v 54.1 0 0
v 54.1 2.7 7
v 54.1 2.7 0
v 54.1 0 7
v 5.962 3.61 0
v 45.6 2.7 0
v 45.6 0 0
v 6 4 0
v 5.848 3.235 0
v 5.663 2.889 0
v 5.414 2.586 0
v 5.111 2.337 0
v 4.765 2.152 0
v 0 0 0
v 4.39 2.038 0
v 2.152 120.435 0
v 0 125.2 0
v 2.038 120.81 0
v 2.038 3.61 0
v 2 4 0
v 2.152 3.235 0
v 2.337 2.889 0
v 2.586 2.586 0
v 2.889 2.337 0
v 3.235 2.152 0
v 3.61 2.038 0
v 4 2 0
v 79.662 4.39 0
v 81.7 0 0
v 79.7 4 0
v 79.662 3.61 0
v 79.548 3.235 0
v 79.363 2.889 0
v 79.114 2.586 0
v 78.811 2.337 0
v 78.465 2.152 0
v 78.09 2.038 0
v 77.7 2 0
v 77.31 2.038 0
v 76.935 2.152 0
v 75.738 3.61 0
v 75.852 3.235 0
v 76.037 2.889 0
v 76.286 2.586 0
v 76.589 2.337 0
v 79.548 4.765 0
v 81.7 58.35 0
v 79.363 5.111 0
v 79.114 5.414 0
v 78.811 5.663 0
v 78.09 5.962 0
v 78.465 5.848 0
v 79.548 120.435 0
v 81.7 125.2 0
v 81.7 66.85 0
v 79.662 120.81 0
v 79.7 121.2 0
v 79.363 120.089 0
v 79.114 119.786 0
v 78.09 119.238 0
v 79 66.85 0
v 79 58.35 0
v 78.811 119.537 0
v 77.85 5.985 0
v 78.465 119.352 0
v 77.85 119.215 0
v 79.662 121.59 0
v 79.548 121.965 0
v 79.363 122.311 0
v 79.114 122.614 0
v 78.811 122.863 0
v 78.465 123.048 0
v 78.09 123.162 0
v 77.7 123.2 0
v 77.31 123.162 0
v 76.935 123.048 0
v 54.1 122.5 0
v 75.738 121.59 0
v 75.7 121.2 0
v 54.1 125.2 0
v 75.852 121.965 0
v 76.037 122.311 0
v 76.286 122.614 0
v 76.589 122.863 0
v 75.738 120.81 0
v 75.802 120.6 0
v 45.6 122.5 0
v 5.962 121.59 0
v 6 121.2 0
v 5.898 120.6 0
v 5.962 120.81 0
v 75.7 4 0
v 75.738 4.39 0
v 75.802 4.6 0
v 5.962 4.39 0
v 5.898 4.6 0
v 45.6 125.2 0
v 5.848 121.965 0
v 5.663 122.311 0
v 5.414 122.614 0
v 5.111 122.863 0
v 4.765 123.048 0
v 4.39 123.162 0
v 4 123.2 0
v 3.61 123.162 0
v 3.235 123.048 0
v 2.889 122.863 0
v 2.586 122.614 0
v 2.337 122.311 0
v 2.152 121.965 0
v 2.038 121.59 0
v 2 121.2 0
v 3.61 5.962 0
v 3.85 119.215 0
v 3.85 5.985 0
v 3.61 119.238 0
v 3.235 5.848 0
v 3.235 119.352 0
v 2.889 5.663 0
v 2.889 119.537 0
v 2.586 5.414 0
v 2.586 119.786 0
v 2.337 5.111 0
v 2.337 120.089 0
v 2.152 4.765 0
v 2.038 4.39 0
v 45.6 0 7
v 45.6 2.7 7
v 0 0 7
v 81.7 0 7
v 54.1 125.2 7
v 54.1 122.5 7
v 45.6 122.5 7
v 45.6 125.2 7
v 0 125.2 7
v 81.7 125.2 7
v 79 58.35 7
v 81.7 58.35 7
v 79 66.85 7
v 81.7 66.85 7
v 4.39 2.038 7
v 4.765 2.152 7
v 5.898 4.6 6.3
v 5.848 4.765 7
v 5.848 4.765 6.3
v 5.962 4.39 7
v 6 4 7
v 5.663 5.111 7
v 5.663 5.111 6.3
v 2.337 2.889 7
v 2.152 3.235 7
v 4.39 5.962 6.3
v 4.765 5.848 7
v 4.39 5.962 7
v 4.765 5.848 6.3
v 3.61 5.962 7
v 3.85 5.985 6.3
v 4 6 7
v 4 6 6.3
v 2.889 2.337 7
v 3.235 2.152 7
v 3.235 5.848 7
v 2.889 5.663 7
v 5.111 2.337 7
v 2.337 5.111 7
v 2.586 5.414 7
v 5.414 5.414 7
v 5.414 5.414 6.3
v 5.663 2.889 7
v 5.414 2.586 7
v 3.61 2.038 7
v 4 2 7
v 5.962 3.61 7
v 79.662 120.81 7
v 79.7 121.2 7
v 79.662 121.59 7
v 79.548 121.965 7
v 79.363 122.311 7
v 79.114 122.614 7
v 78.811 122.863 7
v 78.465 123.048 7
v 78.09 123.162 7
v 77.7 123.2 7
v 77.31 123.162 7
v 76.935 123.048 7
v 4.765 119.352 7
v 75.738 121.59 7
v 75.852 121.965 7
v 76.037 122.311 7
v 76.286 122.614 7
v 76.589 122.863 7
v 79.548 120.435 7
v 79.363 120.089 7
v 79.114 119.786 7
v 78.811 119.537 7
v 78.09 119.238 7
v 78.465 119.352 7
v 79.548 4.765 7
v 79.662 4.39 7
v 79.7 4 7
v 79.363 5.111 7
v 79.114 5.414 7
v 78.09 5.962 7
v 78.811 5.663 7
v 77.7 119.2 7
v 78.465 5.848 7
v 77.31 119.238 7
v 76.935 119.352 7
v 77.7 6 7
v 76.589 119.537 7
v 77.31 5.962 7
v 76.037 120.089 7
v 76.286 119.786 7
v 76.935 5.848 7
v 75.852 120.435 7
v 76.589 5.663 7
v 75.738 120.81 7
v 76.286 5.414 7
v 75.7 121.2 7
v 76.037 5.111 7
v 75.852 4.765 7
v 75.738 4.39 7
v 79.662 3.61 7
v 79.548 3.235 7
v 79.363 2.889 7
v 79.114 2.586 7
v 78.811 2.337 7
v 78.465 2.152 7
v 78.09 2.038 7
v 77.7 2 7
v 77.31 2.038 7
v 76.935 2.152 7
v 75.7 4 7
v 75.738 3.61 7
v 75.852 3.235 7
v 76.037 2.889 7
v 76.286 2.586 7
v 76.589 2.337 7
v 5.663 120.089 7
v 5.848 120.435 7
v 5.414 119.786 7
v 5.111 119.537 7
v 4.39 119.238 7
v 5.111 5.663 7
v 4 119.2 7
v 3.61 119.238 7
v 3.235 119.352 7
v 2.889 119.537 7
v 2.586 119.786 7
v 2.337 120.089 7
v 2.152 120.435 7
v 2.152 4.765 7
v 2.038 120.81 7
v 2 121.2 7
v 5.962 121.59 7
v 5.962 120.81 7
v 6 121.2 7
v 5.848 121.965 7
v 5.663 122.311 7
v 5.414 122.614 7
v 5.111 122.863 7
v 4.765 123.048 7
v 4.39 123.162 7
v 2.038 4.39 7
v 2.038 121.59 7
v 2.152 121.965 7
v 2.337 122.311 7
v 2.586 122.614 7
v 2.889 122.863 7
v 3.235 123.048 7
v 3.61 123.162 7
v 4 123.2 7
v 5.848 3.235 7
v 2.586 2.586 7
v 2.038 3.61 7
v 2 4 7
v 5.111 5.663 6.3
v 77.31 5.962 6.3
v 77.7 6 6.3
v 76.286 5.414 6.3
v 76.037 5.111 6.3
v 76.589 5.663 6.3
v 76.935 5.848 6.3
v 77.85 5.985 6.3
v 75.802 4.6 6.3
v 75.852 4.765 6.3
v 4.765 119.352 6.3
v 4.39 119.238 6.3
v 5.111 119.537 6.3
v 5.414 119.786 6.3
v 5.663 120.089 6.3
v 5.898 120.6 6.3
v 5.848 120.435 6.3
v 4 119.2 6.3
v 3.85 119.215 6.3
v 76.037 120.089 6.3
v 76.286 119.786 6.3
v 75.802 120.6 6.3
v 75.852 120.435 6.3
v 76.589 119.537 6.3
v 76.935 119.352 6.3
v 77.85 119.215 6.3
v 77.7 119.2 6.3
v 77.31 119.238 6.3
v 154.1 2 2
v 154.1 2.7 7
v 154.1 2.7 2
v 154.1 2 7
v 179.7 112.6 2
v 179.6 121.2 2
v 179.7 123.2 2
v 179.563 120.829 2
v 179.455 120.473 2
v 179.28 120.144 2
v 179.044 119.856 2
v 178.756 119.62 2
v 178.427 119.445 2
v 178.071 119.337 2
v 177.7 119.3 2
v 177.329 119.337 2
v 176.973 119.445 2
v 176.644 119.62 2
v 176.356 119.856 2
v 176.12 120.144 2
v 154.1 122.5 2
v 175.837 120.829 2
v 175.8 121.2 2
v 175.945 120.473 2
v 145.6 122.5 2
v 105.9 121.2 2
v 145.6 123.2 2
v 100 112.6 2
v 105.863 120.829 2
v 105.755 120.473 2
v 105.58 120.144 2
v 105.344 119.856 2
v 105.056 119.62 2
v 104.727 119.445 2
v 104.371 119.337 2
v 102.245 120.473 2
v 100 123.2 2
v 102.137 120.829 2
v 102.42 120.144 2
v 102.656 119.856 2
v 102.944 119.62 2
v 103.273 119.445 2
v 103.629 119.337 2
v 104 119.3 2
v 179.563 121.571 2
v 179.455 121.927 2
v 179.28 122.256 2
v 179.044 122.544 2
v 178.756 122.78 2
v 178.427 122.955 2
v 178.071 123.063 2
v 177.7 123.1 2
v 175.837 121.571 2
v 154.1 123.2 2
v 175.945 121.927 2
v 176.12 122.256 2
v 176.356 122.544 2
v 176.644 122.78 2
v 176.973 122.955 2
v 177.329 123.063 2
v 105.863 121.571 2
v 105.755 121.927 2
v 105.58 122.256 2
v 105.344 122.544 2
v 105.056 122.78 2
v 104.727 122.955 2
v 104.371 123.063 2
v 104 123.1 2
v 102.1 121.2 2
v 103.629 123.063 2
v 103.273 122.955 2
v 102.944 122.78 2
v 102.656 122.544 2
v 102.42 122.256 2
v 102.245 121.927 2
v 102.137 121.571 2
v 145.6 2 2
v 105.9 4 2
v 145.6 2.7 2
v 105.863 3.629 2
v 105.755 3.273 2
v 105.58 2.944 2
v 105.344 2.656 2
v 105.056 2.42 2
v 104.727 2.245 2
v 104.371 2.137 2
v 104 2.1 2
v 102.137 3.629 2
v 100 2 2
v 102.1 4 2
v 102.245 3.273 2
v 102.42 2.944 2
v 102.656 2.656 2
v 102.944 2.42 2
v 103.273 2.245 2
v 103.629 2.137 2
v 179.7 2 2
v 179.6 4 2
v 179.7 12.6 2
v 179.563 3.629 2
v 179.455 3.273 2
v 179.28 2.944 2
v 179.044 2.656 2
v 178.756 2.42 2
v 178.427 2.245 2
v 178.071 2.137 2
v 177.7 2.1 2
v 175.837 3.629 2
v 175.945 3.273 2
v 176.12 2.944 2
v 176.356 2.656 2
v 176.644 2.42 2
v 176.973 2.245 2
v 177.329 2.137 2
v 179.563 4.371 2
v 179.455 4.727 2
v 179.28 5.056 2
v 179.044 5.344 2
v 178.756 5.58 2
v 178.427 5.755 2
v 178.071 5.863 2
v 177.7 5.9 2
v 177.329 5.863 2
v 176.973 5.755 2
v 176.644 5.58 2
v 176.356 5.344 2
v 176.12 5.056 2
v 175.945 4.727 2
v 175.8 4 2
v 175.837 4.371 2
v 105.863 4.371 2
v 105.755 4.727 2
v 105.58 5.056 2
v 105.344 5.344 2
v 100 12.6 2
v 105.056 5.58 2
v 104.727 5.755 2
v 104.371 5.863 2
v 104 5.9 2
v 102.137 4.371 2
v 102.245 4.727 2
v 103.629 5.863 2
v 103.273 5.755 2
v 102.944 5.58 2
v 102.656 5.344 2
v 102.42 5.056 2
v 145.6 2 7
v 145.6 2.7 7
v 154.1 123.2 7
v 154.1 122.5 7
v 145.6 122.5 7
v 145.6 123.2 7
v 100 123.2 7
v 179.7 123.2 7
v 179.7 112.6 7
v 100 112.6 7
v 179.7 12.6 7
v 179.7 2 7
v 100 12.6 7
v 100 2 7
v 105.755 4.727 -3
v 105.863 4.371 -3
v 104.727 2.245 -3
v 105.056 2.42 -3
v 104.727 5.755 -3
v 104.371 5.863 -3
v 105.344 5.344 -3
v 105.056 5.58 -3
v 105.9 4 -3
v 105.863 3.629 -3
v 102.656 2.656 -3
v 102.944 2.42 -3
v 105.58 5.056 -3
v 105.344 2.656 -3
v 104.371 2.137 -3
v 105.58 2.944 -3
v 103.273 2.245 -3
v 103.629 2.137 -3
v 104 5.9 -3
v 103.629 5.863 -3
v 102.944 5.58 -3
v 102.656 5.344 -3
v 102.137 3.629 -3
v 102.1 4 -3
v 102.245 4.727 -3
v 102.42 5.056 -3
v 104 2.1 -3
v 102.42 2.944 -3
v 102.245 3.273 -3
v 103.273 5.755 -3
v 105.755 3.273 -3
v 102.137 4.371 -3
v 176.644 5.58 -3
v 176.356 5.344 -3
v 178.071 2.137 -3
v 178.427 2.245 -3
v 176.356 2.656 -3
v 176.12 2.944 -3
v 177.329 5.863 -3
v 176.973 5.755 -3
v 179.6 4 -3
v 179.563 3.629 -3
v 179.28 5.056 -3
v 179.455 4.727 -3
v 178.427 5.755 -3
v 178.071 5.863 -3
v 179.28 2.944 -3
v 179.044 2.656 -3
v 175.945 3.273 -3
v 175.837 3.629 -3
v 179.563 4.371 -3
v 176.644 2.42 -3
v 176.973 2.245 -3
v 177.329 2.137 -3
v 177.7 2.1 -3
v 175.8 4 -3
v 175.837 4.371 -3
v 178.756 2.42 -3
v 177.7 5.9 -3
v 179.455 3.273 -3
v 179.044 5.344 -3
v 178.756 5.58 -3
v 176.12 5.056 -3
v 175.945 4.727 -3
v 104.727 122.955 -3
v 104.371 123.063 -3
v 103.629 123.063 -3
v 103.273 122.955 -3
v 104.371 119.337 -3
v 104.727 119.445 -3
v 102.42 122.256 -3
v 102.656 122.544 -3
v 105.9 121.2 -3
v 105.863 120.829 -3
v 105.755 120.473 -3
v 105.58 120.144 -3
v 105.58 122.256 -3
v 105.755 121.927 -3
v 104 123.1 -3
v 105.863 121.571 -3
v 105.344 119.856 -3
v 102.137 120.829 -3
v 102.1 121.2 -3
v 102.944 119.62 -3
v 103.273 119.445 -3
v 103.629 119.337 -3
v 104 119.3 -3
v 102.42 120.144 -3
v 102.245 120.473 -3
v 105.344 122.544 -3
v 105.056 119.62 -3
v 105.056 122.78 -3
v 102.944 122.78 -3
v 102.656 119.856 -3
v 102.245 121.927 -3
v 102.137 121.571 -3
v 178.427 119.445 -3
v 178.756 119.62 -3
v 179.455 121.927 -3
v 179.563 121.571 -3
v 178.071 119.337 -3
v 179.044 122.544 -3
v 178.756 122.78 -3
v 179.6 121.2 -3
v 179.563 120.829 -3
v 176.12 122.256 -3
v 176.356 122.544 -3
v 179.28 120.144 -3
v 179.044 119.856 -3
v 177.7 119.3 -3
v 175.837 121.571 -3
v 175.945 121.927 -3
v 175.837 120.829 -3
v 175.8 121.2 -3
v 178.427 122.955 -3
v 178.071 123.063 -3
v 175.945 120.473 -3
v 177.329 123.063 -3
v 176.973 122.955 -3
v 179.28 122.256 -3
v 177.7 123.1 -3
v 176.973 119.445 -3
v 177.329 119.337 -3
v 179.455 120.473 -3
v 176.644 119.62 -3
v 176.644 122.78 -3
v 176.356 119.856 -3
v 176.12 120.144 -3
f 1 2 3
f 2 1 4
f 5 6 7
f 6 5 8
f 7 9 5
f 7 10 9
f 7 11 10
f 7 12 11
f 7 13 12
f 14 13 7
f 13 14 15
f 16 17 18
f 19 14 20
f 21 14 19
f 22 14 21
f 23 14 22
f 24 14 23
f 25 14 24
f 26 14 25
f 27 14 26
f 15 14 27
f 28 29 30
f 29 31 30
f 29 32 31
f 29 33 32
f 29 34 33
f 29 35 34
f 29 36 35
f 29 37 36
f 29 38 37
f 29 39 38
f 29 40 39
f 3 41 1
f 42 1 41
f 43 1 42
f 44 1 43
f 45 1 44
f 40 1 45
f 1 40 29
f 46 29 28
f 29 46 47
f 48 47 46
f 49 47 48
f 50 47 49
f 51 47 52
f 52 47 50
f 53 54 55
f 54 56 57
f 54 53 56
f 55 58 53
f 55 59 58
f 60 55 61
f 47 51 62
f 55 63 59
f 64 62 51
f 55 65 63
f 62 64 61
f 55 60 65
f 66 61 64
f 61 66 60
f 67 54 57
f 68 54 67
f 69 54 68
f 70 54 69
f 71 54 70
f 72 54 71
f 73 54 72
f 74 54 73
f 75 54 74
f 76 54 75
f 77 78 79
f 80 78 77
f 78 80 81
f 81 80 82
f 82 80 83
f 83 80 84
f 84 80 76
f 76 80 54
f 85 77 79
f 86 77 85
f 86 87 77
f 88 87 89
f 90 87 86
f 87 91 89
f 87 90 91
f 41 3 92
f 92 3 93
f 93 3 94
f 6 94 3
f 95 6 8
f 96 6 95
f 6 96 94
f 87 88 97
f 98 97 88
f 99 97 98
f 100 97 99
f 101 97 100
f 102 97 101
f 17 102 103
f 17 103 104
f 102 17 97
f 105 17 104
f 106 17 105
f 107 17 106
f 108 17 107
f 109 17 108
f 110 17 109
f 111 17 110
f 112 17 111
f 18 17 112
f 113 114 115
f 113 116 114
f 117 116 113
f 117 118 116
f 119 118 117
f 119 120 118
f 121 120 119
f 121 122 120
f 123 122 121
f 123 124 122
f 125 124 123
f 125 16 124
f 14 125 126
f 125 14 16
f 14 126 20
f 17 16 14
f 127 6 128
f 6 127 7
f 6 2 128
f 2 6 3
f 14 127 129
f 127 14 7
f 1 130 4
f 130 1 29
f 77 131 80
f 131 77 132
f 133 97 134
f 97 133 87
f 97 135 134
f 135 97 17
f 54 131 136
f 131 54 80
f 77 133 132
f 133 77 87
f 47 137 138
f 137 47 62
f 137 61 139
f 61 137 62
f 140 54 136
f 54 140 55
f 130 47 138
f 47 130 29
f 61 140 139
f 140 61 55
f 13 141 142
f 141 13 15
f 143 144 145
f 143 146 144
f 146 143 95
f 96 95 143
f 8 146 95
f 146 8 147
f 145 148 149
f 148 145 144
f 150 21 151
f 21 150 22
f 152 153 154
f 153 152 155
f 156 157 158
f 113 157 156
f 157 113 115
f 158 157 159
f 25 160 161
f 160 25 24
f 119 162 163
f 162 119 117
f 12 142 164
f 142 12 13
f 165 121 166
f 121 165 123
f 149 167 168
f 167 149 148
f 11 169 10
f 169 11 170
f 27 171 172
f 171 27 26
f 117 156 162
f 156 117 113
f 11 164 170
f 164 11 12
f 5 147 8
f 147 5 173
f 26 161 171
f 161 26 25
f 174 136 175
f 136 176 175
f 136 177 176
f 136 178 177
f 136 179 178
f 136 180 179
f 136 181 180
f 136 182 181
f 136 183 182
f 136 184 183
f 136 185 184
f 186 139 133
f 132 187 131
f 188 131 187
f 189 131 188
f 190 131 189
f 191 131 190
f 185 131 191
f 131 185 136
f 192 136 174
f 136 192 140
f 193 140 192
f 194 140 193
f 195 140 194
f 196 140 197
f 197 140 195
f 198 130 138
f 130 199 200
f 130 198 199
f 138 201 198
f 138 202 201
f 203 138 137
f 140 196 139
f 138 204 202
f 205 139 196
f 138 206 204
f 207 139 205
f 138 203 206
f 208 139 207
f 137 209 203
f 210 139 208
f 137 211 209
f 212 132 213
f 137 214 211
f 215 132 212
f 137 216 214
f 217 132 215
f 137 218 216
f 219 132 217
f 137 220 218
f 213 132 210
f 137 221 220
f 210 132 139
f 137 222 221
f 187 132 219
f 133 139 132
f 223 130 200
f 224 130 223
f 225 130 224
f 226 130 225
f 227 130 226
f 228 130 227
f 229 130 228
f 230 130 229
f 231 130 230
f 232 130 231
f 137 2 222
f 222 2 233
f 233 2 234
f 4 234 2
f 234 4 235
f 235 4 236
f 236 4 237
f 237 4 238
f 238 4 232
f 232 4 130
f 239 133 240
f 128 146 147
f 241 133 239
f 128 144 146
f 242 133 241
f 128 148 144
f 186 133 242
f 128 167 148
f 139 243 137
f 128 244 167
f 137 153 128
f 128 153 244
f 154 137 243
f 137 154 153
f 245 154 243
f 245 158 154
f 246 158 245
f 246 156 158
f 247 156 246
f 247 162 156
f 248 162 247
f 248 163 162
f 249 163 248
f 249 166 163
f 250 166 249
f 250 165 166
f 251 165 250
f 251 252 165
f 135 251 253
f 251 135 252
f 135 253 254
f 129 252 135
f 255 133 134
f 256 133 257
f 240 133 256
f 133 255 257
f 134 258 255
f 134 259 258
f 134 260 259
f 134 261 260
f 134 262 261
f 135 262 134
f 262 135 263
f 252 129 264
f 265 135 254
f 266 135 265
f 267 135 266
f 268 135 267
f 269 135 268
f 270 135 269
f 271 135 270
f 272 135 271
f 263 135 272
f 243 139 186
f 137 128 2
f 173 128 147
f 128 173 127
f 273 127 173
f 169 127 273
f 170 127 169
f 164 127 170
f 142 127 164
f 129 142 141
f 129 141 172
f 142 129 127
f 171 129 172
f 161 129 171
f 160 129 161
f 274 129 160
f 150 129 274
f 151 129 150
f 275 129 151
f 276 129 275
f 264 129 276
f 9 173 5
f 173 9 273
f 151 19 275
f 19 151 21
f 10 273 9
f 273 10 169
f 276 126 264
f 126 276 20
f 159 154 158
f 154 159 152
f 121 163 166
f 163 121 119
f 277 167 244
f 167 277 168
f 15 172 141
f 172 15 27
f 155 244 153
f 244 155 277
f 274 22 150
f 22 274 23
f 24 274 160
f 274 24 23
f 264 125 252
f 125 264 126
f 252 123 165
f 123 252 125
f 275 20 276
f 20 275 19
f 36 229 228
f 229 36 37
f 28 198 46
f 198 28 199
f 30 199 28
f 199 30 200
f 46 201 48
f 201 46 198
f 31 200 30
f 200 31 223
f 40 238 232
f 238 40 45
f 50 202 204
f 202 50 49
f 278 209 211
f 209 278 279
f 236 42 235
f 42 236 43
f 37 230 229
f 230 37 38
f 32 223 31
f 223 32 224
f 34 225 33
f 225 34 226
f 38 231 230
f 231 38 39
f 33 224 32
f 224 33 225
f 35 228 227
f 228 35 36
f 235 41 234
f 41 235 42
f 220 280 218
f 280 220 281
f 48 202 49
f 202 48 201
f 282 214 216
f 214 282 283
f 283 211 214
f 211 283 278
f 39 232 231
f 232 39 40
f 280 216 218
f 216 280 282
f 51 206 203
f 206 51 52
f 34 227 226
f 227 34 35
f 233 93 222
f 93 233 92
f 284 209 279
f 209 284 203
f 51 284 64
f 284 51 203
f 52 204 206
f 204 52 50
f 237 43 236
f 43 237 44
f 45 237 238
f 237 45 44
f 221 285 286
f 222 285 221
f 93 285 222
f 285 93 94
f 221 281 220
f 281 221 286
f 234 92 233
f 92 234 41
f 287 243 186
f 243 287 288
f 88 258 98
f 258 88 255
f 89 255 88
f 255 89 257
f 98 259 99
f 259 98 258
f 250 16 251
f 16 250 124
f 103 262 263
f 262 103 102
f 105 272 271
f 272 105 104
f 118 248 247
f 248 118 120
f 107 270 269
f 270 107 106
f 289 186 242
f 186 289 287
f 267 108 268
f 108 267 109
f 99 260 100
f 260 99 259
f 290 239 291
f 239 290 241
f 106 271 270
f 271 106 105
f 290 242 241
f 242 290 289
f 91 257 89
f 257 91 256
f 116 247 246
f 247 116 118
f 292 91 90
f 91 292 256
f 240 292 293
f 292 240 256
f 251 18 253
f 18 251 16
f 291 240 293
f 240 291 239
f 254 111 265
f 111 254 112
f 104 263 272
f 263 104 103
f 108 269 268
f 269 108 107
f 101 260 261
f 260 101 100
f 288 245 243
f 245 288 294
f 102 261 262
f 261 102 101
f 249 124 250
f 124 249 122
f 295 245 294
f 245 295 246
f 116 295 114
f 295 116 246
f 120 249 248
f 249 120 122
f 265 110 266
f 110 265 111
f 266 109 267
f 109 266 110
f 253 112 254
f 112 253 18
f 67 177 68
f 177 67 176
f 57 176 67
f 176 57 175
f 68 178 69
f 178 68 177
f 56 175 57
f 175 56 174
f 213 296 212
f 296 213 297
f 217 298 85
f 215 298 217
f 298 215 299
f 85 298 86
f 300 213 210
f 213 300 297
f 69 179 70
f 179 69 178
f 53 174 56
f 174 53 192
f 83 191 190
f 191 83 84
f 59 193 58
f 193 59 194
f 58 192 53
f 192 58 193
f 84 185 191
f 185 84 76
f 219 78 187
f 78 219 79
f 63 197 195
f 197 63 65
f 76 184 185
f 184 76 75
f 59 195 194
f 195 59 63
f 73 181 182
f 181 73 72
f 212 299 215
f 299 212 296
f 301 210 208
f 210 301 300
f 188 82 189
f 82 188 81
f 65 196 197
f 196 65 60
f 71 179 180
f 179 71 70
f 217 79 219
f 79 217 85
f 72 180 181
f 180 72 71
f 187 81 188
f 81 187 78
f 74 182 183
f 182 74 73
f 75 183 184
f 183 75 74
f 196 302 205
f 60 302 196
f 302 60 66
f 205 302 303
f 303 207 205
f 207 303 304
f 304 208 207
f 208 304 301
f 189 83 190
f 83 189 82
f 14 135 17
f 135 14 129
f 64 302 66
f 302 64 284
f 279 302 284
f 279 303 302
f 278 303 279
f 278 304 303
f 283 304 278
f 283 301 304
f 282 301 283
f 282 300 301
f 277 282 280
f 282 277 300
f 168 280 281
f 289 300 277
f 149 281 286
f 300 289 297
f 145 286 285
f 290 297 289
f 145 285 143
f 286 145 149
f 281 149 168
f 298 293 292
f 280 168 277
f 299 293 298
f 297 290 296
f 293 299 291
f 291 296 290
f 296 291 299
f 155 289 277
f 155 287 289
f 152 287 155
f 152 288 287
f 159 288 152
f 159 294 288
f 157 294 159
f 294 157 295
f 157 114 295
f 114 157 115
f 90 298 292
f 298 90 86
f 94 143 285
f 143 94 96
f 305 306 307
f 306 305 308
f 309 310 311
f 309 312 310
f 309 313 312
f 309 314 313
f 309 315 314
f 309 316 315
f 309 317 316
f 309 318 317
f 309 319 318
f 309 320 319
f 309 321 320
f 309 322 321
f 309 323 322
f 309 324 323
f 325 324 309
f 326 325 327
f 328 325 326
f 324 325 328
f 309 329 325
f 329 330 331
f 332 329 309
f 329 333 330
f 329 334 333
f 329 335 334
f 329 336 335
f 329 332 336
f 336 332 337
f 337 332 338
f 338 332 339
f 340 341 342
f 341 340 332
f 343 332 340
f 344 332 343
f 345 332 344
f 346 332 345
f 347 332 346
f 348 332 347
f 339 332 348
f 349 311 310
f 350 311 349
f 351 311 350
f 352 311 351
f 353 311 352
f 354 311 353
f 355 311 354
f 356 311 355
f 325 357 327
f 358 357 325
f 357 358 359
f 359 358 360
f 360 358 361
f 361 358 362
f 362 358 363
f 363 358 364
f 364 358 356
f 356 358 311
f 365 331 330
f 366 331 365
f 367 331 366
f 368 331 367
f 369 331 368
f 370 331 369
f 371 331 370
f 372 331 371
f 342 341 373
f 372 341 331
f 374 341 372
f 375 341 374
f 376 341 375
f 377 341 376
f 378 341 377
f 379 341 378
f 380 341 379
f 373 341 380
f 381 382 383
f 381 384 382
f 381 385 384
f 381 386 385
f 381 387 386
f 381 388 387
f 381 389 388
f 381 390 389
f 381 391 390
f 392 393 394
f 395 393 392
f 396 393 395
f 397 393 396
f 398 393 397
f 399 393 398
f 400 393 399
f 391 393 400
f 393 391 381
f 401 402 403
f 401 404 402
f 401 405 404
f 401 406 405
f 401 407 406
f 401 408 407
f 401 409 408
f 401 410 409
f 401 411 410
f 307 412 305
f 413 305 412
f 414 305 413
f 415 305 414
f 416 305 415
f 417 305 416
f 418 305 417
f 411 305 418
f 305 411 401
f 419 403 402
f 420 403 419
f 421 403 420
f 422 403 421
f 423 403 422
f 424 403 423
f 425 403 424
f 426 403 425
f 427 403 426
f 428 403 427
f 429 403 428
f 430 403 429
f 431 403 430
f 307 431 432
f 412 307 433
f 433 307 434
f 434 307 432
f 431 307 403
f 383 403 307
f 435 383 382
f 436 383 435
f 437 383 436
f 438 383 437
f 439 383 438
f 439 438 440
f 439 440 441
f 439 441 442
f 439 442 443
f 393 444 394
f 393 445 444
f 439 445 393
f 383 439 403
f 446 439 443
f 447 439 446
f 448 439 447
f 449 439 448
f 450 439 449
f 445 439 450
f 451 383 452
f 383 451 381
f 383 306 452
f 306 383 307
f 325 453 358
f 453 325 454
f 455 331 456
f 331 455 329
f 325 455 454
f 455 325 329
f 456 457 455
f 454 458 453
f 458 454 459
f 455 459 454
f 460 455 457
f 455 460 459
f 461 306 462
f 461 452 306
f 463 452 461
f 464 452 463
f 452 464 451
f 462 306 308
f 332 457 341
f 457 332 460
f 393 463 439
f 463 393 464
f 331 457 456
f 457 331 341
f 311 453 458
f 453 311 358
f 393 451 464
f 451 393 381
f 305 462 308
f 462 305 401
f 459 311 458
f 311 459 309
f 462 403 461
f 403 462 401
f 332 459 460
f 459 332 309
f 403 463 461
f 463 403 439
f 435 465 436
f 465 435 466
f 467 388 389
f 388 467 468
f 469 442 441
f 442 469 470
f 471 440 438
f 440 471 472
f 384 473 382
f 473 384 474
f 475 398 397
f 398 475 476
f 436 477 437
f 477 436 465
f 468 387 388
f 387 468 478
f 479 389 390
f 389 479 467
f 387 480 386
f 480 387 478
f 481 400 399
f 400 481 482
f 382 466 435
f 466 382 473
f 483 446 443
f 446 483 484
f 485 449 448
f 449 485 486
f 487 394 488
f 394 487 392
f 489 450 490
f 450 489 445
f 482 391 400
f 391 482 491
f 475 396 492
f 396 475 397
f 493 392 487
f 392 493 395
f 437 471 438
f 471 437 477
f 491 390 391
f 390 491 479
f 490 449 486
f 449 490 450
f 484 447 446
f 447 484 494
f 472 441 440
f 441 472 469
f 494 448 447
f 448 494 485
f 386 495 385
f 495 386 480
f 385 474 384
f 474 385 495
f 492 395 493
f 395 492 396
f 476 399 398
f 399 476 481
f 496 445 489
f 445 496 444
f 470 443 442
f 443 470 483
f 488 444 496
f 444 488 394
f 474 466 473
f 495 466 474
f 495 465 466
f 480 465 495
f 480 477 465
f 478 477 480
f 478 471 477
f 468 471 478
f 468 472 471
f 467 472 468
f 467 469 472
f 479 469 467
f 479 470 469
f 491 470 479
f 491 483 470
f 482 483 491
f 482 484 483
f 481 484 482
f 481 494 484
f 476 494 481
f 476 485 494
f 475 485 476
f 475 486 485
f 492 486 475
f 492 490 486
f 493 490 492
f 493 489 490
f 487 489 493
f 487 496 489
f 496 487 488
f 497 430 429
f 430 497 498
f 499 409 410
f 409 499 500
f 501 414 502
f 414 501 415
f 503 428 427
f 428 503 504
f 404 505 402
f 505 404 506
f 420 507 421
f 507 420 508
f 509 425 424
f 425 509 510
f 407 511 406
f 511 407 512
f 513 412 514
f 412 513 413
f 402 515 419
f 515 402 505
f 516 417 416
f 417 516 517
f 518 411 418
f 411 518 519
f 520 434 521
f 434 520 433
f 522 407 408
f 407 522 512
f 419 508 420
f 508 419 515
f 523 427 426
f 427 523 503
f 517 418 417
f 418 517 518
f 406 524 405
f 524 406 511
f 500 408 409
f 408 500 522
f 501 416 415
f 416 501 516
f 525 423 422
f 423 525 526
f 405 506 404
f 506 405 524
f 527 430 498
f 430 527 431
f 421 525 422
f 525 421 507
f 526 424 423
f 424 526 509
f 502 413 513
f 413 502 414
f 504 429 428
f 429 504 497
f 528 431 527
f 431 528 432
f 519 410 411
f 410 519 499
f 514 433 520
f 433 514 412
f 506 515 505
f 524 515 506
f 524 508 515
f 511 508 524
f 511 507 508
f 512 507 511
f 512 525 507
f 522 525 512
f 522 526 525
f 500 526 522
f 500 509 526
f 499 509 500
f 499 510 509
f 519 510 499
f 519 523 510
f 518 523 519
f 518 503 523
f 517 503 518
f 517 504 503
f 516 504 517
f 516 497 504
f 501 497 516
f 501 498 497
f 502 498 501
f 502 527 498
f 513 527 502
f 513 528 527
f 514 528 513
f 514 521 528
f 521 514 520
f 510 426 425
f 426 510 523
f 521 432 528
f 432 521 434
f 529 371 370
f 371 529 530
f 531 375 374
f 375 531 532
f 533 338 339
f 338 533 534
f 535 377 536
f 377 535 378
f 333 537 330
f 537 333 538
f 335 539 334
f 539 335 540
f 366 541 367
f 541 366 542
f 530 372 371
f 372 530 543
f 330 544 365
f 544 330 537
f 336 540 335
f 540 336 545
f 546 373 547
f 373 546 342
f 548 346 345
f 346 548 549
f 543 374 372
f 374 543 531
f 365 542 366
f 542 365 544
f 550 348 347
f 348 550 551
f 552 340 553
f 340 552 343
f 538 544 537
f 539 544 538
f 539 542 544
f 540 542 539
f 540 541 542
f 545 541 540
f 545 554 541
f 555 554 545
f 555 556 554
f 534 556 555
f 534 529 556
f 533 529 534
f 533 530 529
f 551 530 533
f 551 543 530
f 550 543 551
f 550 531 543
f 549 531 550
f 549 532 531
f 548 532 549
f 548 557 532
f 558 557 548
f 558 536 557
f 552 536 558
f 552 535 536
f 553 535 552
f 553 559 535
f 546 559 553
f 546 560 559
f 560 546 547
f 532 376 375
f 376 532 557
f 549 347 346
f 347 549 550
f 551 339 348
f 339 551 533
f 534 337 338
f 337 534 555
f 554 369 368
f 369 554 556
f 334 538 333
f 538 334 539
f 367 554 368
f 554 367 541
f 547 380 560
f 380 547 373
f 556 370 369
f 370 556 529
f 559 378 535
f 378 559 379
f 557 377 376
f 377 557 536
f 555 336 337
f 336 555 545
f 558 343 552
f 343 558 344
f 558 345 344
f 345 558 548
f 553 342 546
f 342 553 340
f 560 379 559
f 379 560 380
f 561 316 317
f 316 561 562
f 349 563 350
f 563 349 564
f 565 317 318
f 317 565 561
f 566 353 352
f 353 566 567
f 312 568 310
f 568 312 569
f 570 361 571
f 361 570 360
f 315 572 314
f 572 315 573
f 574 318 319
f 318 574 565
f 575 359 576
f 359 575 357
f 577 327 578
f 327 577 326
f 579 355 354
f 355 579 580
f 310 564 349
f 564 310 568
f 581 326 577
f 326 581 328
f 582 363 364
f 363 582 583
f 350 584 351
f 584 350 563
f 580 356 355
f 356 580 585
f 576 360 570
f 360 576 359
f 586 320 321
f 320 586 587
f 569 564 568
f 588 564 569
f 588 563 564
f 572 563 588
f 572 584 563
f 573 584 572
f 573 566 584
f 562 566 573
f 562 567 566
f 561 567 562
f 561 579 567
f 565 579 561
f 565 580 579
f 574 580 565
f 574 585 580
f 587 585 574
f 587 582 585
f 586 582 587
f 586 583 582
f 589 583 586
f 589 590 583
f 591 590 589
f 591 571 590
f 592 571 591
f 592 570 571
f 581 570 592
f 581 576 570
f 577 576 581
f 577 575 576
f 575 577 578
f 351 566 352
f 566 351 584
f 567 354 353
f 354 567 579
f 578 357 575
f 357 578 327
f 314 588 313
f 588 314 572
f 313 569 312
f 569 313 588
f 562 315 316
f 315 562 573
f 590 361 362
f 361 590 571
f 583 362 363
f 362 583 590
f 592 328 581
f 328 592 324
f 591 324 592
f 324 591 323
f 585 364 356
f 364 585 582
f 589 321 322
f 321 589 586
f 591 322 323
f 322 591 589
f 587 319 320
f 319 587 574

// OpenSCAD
//
// OpenSCAD file describing a 3" floppy disk insert for Oric tape box, including:
// - A hollow main plate to install inside the case
// - Two clip-on bits designed to restrain the floppy inside the case so it does not move around
//

// Main body of the insert
main_frame      = [81.7,125.2,7];                            // Dimensions of the main box area
frame_thickness = 0.7;
bottom_cut_out  = [74,116,main_frame[2]-frame_thickness];    // Dimensions of the hollowed area under

text_height = frame_thickness; //0.3;        // Raised text height
text_box    = [70,40,1];

frame_color = "#000000";
text_color  = "#e8dbb7";
show_text   = 1;

generate_main_frame();
generate_plug_ins();
generate_logo_text();

module generate_main_frame()
{
    difference() 
    {     
        // The main insert plate
        color(frame_color)
        cube(main_frame);          

        // Hollowed-out Defence Force logo centered on the box
        translate([main_frame[0]/2,main_frame[1]/2,main_frame[2]-text_height])
        framed_text();     
        
        // Removal of the back part
        translate([(main_frame[0] - bottom_cut_out[0]) / 2, (main_frame[1] - bottom_cut_out[1]) / 2, 0])
        cube(bottom_cut_out);

        // Add the three notches (top, bottom and right side)
        notches();         

        // Make the holes for the pegs
        connectors(0);     
    }
}


module generate_logo_text()
{
    translate([main_frame[0]/2,main_frame[1]/2,main_frame[2]-text_height])
    color(text_color)
    framed_text();     
}


module generate_plug_ins()
{
    // Plug-in elements
    top_layer = [main_frame[0], main_frame[1], 5];
    top_cut_out = [top_layer[0], 100, 5];
    cover_ridge_out = [top_layer[0], 2, 5];
    cover_ridge_out2 = [2,top_layer[1], 5];
    peg_clearance = 0.2;  // Clearance for pegs (for fit)

    translate([+100,0,main_frame[2]-top_layer[2]])        // Only necessary when showing the template
    {
        difference() 
        {      
            color(frame_color)
            cube(top_layer);   // Outer box

            translate([0,main_frame[1]-cover_ridge_out[1],0])
            cube(cover_ridge_out);   // Top ridge

            translate([0,0,0])
            cube(cover_ridge_out);   // Bottom ridge

            translate([main_frame[0]-cover_ridge_out2[0],0,0])
            cube(cover_ridge_out2);   // Right side ridge

            notches();         // Add the three notches

            // Removal of the center part
            translate([(main_frame[0] - top_cut_out[0]) / 2, (main_frame[1] - top_cut_out[1]) / 2, 0])
            cube(top_cut_out);  
        }
        translate([0,0,-top_layer[2]])  // We need the pegs to go down
        color(frame_color)
        connectors(peg_clearance);                   // Make the pegs
    }
}


module framed_text()
{
    if (show_text)
    {
        text_size = 10;                     // Font size
        defence_force_font = "Core Sans G:style=95 Black";
        
        // Rectangle frame around the text   
        rectangle(70,34,0.5,text_color);
        
        // "DEFENCE"
        translate([0,+8,0])
        linear_extrude(height=text_height)
        text("DEFENCE", size=text_size, font=defence_force_font, halign="center", valign="center");

        // "FORCE"
        translate([0,-8,0])
        linear_extrude(height=text_height)
        text("FORCE", size=text_size, font=defence_force_font, halign="center", valign="center");
    }
}


module rectangle(frame_width,frame_height,frame_thickness,color)
{
    color(color)
    linear_extrude(height=text_height)
    difference() 
    {
        // Outer rectangle
        square([frame_width, frame_height],center=true); 
        // Inner cutout
        square([frame_width - 2*frame_thickness, frame_height - 2*frame_thickness],center=true);         
    }
}


module notches()
{
    notch_size = [8.5, 2.7, 10];      // The three notches to close the box
    notch_edge_offset = 45.6;         // The top and bottom notches are not centered
    
    // Bottom notch
    translate([notch_edge_offset,0,0])
    cube(notch_size);

    // Top notch
    translate([notch_edge_offset,main_frame[1]-notch_size[1],0])
    cube(notch_size);

    // Side notch
    translate([main_frame[0],(main_frame[1]-notch_size[0])/2,0])
    rotate(90)
    cube(notch_size);
}


module connectors(clearance = 0) 
{
    hole_diameter = 4;    // Diameter of holes/pegs
    hole_depth = 7;       // Depth of holes (≤1mm for base plate)
    
    translate([4,4,0])
    cylinder(h=hole_depth, d=hole_diameter-clearance, $fn=32);

    translate([main_frame[0]-4,4,0])
    cylinder(h=hole_depth, d=hole_diameter-clearance, $fn=32);

    translate([4,main_frame[1]-4,0])
    cylinder(h=hole_depth, d=hole_diameter-clearance, $fn=32);

    translate([main_frame[0]-4,main_frame[1]-4,0])
    cylinder(h=hole_depth, d=hole_diameter-clearance, $fn=32);
}
